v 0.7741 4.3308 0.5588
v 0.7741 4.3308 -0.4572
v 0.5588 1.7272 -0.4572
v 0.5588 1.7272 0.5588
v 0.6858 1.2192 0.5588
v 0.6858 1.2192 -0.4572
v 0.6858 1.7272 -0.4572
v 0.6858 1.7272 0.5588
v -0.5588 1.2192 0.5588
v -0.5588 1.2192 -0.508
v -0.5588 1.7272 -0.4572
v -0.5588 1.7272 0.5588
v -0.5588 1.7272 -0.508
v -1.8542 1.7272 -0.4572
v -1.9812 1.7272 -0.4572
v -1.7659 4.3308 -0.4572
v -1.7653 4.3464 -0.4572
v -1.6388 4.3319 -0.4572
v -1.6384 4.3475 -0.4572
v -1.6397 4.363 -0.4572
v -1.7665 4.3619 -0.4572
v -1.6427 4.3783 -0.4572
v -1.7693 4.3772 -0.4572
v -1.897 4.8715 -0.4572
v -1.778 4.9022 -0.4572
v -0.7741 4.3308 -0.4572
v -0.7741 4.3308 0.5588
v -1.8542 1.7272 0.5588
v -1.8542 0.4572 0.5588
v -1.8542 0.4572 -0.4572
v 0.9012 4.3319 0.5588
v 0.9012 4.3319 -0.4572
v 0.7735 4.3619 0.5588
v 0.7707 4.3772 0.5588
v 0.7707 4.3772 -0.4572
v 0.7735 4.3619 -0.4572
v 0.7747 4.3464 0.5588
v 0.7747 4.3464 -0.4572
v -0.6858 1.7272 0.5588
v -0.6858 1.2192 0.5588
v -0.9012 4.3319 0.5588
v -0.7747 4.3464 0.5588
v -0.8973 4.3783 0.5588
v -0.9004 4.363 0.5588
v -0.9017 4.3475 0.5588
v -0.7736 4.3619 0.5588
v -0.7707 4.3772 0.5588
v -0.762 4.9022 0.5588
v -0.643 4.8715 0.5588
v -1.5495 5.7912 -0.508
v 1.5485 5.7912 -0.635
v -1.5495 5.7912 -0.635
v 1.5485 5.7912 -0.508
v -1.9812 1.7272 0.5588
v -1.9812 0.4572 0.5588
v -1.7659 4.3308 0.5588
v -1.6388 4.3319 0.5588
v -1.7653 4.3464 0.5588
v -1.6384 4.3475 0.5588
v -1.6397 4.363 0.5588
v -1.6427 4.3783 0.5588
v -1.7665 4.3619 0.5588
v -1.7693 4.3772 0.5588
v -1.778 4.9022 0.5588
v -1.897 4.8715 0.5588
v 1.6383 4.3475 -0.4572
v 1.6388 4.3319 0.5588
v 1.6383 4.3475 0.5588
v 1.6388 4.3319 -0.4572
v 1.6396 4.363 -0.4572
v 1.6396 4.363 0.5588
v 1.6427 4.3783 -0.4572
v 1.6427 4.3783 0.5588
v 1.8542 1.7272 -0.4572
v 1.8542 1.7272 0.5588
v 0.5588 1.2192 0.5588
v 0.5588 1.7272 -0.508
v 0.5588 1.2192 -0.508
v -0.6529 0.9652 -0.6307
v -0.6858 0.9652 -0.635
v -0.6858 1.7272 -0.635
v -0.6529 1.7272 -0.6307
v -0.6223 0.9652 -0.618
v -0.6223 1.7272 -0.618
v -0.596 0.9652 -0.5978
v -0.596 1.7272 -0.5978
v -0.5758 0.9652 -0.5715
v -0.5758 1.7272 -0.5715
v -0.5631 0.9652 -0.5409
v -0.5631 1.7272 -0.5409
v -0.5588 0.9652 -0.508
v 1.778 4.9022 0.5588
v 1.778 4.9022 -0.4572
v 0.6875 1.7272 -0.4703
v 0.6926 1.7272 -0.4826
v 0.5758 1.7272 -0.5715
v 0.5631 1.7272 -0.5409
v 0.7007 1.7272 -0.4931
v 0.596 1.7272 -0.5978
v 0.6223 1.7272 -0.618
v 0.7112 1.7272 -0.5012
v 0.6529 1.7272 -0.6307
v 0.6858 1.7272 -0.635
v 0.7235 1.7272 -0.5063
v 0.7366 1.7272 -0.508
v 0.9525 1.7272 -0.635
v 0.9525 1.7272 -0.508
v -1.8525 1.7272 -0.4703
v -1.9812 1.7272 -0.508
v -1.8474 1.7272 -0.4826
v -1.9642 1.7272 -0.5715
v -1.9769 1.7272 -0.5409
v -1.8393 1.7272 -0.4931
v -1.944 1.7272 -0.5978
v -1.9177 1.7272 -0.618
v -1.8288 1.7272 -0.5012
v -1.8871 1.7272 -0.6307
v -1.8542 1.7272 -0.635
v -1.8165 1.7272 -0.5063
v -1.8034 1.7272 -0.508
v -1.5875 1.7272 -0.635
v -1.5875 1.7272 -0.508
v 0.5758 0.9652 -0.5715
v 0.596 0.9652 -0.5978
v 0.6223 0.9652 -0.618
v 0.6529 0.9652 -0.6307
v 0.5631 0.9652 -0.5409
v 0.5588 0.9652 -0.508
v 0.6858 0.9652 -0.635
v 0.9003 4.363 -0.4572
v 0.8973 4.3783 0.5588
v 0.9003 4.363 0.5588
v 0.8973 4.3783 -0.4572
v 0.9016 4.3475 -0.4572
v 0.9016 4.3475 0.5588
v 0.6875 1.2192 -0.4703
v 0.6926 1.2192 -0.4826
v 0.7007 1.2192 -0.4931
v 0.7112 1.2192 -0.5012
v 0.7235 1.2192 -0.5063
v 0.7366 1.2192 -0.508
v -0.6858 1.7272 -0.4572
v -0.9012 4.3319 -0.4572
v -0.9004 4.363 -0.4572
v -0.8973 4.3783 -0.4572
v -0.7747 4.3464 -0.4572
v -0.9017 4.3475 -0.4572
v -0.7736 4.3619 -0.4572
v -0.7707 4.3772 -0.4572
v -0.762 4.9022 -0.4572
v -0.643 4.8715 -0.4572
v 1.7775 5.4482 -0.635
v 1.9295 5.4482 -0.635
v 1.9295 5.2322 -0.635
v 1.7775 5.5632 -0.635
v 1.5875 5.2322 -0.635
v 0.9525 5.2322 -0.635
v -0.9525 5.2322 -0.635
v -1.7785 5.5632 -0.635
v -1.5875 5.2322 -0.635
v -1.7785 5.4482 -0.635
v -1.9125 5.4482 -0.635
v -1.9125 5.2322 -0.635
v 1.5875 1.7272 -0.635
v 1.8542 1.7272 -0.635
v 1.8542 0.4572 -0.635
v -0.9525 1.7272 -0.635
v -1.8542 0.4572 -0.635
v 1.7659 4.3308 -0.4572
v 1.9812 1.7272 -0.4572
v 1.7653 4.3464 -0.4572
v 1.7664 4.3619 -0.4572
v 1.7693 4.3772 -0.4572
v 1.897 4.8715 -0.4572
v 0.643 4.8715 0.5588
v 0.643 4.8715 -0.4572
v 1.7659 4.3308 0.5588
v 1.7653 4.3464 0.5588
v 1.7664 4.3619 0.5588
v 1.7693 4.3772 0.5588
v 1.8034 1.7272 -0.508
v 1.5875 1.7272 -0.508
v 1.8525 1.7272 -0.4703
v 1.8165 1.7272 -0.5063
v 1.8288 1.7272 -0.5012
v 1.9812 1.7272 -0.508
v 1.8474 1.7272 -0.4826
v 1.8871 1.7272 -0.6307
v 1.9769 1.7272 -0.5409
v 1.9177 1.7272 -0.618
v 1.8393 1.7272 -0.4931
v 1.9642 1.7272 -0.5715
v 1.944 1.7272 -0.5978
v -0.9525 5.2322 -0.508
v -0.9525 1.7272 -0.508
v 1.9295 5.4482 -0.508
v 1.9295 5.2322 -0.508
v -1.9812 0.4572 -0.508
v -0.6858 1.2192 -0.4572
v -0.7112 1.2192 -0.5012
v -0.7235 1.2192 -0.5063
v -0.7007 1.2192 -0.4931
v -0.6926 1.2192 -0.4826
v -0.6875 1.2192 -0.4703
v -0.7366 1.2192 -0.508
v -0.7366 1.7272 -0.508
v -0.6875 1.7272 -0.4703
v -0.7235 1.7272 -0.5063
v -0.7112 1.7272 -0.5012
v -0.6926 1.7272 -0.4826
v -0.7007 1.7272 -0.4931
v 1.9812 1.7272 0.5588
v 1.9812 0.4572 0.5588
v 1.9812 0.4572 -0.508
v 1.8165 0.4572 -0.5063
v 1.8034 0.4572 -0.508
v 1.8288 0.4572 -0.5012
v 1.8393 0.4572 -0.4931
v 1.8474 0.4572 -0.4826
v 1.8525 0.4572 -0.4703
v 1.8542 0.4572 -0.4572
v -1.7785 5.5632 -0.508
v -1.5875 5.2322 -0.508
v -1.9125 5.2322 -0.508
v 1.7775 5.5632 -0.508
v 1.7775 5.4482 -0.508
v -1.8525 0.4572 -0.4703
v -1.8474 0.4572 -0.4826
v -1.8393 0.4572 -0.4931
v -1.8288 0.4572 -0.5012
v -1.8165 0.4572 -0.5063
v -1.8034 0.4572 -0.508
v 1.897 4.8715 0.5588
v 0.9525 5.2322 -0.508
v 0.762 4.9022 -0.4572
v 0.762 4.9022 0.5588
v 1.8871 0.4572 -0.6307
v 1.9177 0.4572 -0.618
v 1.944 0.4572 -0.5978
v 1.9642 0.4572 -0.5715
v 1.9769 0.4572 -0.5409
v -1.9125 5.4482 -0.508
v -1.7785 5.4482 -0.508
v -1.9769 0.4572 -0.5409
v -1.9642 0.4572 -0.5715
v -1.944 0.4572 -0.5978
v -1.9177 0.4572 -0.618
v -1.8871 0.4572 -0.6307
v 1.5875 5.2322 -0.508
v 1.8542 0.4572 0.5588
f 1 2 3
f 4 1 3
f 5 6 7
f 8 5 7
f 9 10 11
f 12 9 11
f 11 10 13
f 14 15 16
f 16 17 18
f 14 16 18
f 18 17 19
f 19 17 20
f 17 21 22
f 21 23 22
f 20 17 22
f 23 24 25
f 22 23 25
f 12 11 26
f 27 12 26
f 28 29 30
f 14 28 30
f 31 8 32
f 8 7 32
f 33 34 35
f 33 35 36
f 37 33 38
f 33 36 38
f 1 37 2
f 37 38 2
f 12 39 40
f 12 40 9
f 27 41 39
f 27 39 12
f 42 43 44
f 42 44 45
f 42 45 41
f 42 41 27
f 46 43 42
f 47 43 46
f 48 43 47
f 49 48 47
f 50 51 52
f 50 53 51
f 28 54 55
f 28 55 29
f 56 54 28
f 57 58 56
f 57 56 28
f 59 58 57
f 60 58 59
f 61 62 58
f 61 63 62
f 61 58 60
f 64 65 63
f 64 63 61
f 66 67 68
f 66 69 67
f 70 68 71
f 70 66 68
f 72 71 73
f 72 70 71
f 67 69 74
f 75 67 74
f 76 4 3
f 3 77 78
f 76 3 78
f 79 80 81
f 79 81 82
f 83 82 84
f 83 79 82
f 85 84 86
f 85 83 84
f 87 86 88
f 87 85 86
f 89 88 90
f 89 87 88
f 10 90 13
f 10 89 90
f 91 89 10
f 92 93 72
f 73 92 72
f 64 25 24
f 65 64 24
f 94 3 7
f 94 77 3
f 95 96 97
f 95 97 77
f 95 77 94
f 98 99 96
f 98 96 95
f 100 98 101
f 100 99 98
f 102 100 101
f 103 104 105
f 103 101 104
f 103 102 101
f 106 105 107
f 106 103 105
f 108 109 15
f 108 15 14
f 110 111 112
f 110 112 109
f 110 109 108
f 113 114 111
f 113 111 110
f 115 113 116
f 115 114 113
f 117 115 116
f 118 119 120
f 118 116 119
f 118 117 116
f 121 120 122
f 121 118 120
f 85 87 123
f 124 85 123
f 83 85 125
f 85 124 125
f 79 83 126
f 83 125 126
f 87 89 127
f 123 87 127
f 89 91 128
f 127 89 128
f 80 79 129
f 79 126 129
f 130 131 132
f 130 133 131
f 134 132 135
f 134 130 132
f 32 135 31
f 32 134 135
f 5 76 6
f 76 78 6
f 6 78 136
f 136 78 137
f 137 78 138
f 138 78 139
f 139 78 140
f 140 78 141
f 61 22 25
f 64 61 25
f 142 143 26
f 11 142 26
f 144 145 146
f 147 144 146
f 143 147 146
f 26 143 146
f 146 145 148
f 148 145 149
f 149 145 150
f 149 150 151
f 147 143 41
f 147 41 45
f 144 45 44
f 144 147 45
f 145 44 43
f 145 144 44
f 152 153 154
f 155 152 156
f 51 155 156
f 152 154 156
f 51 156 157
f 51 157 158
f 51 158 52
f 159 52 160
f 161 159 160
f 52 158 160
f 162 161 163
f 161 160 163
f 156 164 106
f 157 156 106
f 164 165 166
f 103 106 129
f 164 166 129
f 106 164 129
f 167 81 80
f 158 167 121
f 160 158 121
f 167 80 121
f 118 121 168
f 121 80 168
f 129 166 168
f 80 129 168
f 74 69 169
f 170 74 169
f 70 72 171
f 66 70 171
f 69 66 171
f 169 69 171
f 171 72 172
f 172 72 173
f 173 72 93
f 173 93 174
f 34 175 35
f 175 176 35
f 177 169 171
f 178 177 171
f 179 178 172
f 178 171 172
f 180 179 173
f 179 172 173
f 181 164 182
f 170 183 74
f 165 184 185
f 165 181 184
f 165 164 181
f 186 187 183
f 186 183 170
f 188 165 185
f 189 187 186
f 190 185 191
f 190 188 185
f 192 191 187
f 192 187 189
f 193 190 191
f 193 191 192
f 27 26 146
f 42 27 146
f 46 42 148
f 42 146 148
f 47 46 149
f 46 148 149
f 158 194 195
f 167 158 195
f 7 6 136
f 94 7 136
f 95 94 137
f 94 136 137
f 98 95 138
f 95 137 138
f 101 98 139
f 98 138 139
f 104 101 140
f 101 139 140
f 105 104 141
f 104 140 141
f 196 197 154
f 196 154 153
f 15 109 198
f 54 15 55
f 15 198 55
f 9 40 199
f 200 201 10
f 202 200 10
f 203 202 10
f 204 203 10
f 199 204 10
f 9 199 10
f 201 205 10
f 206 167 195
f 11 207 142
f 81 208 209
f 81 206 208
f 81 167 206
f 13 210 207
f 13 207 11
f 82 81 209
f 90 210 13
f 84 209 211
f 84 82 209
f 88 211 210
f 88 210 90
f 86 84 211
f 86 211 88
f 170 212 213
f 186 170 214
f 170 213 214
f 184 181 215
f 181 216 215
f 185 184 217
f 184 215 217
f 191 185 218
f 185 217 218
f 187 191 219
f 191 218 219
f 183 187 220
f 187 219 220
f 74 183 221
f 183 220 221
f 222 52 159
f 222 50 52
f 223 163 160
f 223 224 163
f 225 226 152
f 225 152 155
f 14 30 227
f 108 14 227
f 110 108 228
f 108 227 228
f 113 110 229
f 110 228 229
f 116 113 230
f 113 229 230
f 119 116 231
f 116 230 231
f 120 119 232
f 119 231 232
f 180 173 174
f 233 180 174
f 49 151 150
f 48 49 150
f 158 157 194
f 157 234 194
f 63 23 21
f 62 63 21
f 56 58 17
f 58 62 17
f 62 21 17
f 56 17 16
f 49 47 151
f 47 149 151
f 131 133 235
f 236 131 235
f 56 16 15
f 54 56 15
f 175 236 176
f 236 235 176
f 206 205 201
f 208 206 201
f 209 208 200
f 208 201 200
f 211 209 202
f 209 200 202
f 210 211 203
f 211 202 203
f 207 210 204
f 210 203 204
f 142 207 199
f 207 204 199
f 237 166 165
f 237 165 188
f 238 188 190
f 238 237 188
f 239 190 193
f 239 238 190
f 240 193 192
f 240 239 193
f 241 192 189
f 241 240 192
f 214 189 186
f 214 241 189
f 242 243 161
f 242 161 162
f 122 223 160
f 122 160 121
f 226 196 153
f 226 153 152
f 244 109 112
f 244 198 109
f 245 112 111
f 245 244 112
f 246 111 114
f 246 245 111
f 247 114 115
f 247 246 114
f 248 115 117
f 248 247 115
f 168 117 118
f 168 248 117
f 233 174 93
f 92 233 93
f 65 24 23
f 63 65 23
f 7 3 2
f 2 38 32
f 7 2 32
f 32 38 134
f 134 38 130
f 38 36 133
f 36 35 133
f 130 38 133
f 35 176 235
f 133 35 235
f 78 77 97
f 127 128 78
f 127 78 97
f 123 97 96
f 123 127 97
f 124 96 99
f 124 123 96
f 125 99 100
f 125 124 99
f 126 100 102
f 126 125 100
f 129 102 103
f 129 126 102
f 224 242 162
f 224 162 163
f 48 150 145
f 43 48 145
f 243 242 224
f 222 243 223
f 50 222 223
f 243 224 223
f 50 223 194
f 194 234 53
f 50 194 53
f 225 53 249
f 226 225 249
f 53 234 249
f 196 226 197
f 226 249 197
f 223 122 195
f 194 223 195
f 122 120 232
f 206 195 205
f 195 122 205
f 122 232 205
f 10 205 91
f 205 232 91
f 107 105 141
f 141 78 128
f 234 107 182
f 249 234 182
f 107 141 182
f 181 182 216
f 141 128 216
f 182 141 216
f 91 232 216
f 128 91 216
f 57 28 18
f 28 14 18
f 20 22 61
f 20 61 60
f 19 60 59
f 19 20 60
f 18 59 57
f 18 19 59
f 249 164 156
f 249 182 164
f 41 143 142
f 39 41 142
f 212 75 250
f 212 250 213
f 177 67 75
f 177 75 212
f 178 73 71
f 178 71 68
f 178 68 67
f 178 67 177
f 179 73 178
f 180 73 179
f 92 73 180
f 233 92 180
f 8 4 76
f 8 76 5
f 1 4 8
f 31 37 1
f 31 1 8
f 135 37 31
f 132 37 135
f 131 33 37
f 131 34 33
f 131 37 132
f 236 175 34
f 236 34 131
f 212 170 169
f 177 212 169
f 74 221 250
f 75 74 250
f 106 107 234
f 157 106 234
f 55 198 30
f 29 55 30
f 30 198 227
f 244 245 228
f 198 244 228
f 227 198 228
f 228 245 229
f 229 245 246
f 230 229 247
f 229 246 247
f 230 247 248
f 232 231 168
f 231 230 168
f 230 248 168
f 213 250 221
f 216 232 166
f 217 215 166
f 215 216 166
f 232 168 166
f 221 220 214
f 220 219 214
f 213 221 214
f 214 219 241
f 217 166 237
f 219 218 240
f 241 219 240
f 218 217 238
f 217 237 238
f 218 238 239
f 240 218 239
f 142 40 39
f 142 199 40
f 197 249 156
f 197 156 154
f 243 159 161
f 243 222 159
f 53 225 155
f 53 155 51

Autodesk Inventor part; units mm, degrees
sketch "Sketch__1" plane through (0, 0, -0.508) normal (0, 0, 1) x (1, 0, 0)
  line L0 (-1.9125, 5.4482) -> (-1.9125, 5.2322)
  line L1 (-1.9125, 5.2322) -> (-1.5875, 5.2322)
  line L2 (-1.5875, 5.2322) -> (-1.5875, 0.4572)
  line L3 (-1.5875, 0.4572) -> (1.5875, 0.4572)
  line L4 (1.5875, 0.4572) -> (1.5875, 5.2322)
  line L5 (1.5875, 5.2322) -> (1.9295, 5.2322)
  line L6 (1.9295, 5.2322) -> (1.9295, 5.4482)
  line L7 (1.9295, 5.4482) -> (1.7775, 5.4482)
  line L8 (1.7775, 5.4482) -> (1.7775, 5.5632)
  line L9 (1.7775, 5.5632) -> (1.5485, 5.7912)
  line L10 (1.5485, 5.7912) -> (-1.5495, 5.7912)
  line L11 (-1.5495, 5.7912) -> (-1.7785, 5.5632)
  line L12 (-1.7785, 5.5632) -> (-1.7785, 5.4482)
  line L13 (-1.7785, 5.4482) -> (-1.9125, 5.4482)
  line L14 (-0.9525, 0.9652) -> (0.9525, 0.9652)
  line L15 (0.9525, 0.9652) -> (0.9525, 5.2322)
  line L16 (0.9525, 5.2322) -> (-0.9525, 5.2322)
  line L17 (-0.9525, 5.2322) -> (-0.9525, 0.9652)
extrude "Extrusion1" add sketch "Sketch__1" against normal blind 0.127
sketch "Sketch_1" plane through (0, 0.4572, 0) normal (0, 1, 0) x (1, 0, 0)
  line L0 (0.5588, 0.508) -> (0.5588, 0.4572)
  line L1 (0.5588, 0.4572) -> (0.6858, 0.4572)
  arc A0 (0.7366, 0.508) -> (0.6858, 0.4572) centre (0.7366, 0.4572) ccw
  line L2 (0.7366, 0.508) -> (1.8034, 0.508)
  arc A1 (1.8542, 0.4572) -> (1.8034, 0.508) centre (1.8034, 0.4572) ccw
  line L3 (1.8542, 0.4572) -> (1.8542, -0.5588)
  line L4 (1.8542, -0.5588) -> (1.9812, -0.5588)
  line L5 (1.9812, -0.5588) -> (1.9812, 0.508)
  arc A2 (1.9812, 0.508) -> (1.8542, 0.635) centre (1.8542, 0.508) ccw
  line L6 (1.8542, 0.635) -> (0.6858, 0.635)
  arc A3 (0.6858, 0.635) -> (0.5588, 0.508) centre (0.6858, 0.508) ccw
extrude "Extrusion2" add sketch "Sketch_1" along normal blind 1.27
sketch "Sketch_2" plane through (0, 0.4572, 0) normal (0, 1, 0) x (1, 0, 0)
  line L0 (-1.9812, 0.508) -> (-1.9812, -0.5588)
  line L1 (-1.9812, -0.5588) -> (-1.8542, -0.5588)
  line L2 (-1.8542, -0.5588) -> (-1.8542, 0.4572)
  arc A0 (-1.8034, 0.508) -> (-1.8542, 0.4572) centre (-1.8034, 0.4572) ccw
  line L3 (-1.8034, 0.508) -> (-0.7366, 0.508)
  arc A1 (-0.6858, 0.4572) -> (-0.7366, 0.508) centre (-0.7366, 0.4572) ccw
  line L4 (-0.6858, 0.4572) -> (-0.5588, 0.4572)
  line L5 (-0.5588, 0.4572) -> (-0.5588, 0.508)
  arc A2 (-0.5588, 0.508) -> (-0.6858, 0.635) centre (-0.6858, 0.508) ccw
  line L6 (-0.6858, 0.635) -> (-1.8542, 0.635)
  arc A3 (-1.8542, 0.635) -> (-1.9812, 0.508) centre (-1.8542, 0.508) ccw
extrude "Extrusion3" add sketch "Sketch_2" along normal blind 1.27
sketch "Sketch_3" plane through (0, 0.4572, 0) normal (0, 1, 0) x (1, 0, 0)
  line L0 (-0.8128, 0.508) -> (-0.8128, -0.508)
  line L1 (-0.8128, -0.508) -> (0.8128, -0.508)
  line L2 (0.8128, -0.508) -> (0.8128, 0.508)
  line L3 (0.8128, 0.508) -> (-0.8128, 0.508)
extrude "Extrusion4" cut sketch "Sketch_3" along normal blind 0.762
sketch "Sketch_4" plane through (0, 0, -0.4572) normal (0, 0, 1) x (1, 0, 0)
  line L0 (-1.9812, 1.7272) -> (-1.9812, 1.2192)
  line L1 (-1.9812, 1.2192) -> (-0.5588, 1.2192)
  line L2 (-0.5588, 1.2192) -> (-0.5588, 1.7272)
  line L3 (-0.5588, 1.7272) -> (-0.7741, 4.3308)
  arc A0 (-0.7707, 4.3772) -> (-0.7741, 4.3308) centre (-0.635, 4.3437) ccw
  line L4 (-0.7707, 4.3772) -> (-0.643, 4.8715)
  line L5 (-0.643, 4.8715) -> (-0.762, 4.9022)
  line L6 (-0.762, 4.9022) -> (-0.8973, 4.3783)
  arc A1 (-0.8973, 4.3783) -> (-0.9012, 4.3319) centre (-0.762, 4.3434) ccw
  line L7 (-0.9012, 4.3319) -> (-0.6858, 1.7272)
  line L8 (-0.6858, 1.7272) -> (-0.6858, 1.2954)
  line L9 (-0.6858, 1.2954) -> (-1.8542, 1.2954)
  line L10 (-1.8542, 1.2954) -> (-1.8542, 1.7272)
  line L11 (-1.8542, 1.7272) -> (-1.6388, 4.3319)
  arc A2 (-1.6388, 4.3319) -> (-1.6427, 4.3783) centre (-1.778, 4.3434) ccw
  line L12 (-1.6427, 4.3783) -> (-1.778, 4.9022)
  line L13 (-1.778, 4.9022) -> (-1.897, 4.8715)
  line L14 (-1.897, 4.8715) -> (-1.7693, 4.3772)
  arc A3 (-1.7659, 4.3308) -> (-1.7693, 4.3772) centre (-1.905, 4.3437) ccw
  line L15 (-1.7659, 4.3308) -> (-1.9812, 1.7272)
extrude "Extrusion5" add sketch "Sketch_4" along normal blind 1.016
sketch "Sketch_5" plane through (0, 0, -0.4572) normal (0, 0, 1) x (1, 0, 0)
  line L0 (0.5588, 1.7272) -> (0.5588, 1.2192)
  line L1 (0.5588, 1.2192) -> (1.9812, 1.2192)
  line L2 (1.9812, 1.2192) -> (1.9812, 1.7272)
  line L3 (1.9812, 1.7272) -> (1.7659, 4.3308)
  arc A0 (1.7693, 4.3772) -> (1.7659, 4.3308) centre (1.905, 4.3437) ccw
  line L4 (1.7693, 4.3772) -> (1.897, 4.8715)
  line L5 (1.897, 4.8715) -> (1.778, 4.9022)
  line L6 (1.778, 4.9022) -> (1.6427, 4.3783)
  arc A1 (1.6427, 4.3783) -> (1.6388, 4.3319) centre (1.778, 4.3434) ccw
  line L7 (1.6388, 4.3319) -> (1.8542, 1.7272)
  line L8 (1.8542, 1.7272) -> (1.8542, 1.2954)
  line L9 (1.8542, 1.2954) -> (0.6858, 1.2954)
  line L10 (0.6858, 1.2954) -> (0.6858, 1.7272)
  line L11 (0.6858, 1.7272) -> (0.9012, 4.3319)
  arc A2 (0.9012, 4.3319) -> (0.8973, 4.3783) centre (0.762, 4.3434) ccw
  line L12 (0.8973, 4.3783) -> (0.762, 4.9022)
  line L13 (0.762, 4.9022) -> (0.643, 4.8715)
  line L14 (0.643, 4.8715) -> (0.7707, 4.3772)
  arc A3 (0.7741, 4.3308) -> (0.7707, 4.3772) centre (0.635, 4.3437) ccw
  line L15 (0.7741, 4.3308) -> (0.5588, 1.7272)
extrude "Extrusion6" add sketch "Sketch_5" along normal blind 1.016
sketch "Sketch_6" plane through (0, 0, -0.4572) normal (0, 0, 1) x (1, 0, 0)
  line L0 (-1.8542, 1.397) -> (-1.8542, 0)
  line L1 (-1.8542, 0) -> (1.8542, 0)
  line L2 (1.8542, 0) -> (1.8542, 1.397)
  line L3 (1.8542, 1.397) -> (0.6858, 1.397)
  line L4 (0.6858, 1.397) -> (0.6858, 0.0762)
  line L5 (0.6858, 0.0762) -> (-0.6858, 0.0762)
  line L6 (-0.6858, 0.0762) -> (-0.6858, 1.397)
  line L7 (-0.6858, 1.397) -> (-1.8542, 1.397)
extrude "Extrusion7" cut sketch "Sketch_6" along normal blind 1.27
ref_plane "pins_to_body_XY" through (0, 0, -0.0381) normal (0, 1, 0) x (1, 0, 0)
ref_plane "pins_to_body_YZ" through (0, 0, -0.0381) normal (1, 0, 0) x (0, 0, -1)
ref_plane "pins_to_body_ZX" through (0, 0, -0.0381) normal (0, 0, -1) x (0, 1, 0)
properties part number "SNT-100_pins"
